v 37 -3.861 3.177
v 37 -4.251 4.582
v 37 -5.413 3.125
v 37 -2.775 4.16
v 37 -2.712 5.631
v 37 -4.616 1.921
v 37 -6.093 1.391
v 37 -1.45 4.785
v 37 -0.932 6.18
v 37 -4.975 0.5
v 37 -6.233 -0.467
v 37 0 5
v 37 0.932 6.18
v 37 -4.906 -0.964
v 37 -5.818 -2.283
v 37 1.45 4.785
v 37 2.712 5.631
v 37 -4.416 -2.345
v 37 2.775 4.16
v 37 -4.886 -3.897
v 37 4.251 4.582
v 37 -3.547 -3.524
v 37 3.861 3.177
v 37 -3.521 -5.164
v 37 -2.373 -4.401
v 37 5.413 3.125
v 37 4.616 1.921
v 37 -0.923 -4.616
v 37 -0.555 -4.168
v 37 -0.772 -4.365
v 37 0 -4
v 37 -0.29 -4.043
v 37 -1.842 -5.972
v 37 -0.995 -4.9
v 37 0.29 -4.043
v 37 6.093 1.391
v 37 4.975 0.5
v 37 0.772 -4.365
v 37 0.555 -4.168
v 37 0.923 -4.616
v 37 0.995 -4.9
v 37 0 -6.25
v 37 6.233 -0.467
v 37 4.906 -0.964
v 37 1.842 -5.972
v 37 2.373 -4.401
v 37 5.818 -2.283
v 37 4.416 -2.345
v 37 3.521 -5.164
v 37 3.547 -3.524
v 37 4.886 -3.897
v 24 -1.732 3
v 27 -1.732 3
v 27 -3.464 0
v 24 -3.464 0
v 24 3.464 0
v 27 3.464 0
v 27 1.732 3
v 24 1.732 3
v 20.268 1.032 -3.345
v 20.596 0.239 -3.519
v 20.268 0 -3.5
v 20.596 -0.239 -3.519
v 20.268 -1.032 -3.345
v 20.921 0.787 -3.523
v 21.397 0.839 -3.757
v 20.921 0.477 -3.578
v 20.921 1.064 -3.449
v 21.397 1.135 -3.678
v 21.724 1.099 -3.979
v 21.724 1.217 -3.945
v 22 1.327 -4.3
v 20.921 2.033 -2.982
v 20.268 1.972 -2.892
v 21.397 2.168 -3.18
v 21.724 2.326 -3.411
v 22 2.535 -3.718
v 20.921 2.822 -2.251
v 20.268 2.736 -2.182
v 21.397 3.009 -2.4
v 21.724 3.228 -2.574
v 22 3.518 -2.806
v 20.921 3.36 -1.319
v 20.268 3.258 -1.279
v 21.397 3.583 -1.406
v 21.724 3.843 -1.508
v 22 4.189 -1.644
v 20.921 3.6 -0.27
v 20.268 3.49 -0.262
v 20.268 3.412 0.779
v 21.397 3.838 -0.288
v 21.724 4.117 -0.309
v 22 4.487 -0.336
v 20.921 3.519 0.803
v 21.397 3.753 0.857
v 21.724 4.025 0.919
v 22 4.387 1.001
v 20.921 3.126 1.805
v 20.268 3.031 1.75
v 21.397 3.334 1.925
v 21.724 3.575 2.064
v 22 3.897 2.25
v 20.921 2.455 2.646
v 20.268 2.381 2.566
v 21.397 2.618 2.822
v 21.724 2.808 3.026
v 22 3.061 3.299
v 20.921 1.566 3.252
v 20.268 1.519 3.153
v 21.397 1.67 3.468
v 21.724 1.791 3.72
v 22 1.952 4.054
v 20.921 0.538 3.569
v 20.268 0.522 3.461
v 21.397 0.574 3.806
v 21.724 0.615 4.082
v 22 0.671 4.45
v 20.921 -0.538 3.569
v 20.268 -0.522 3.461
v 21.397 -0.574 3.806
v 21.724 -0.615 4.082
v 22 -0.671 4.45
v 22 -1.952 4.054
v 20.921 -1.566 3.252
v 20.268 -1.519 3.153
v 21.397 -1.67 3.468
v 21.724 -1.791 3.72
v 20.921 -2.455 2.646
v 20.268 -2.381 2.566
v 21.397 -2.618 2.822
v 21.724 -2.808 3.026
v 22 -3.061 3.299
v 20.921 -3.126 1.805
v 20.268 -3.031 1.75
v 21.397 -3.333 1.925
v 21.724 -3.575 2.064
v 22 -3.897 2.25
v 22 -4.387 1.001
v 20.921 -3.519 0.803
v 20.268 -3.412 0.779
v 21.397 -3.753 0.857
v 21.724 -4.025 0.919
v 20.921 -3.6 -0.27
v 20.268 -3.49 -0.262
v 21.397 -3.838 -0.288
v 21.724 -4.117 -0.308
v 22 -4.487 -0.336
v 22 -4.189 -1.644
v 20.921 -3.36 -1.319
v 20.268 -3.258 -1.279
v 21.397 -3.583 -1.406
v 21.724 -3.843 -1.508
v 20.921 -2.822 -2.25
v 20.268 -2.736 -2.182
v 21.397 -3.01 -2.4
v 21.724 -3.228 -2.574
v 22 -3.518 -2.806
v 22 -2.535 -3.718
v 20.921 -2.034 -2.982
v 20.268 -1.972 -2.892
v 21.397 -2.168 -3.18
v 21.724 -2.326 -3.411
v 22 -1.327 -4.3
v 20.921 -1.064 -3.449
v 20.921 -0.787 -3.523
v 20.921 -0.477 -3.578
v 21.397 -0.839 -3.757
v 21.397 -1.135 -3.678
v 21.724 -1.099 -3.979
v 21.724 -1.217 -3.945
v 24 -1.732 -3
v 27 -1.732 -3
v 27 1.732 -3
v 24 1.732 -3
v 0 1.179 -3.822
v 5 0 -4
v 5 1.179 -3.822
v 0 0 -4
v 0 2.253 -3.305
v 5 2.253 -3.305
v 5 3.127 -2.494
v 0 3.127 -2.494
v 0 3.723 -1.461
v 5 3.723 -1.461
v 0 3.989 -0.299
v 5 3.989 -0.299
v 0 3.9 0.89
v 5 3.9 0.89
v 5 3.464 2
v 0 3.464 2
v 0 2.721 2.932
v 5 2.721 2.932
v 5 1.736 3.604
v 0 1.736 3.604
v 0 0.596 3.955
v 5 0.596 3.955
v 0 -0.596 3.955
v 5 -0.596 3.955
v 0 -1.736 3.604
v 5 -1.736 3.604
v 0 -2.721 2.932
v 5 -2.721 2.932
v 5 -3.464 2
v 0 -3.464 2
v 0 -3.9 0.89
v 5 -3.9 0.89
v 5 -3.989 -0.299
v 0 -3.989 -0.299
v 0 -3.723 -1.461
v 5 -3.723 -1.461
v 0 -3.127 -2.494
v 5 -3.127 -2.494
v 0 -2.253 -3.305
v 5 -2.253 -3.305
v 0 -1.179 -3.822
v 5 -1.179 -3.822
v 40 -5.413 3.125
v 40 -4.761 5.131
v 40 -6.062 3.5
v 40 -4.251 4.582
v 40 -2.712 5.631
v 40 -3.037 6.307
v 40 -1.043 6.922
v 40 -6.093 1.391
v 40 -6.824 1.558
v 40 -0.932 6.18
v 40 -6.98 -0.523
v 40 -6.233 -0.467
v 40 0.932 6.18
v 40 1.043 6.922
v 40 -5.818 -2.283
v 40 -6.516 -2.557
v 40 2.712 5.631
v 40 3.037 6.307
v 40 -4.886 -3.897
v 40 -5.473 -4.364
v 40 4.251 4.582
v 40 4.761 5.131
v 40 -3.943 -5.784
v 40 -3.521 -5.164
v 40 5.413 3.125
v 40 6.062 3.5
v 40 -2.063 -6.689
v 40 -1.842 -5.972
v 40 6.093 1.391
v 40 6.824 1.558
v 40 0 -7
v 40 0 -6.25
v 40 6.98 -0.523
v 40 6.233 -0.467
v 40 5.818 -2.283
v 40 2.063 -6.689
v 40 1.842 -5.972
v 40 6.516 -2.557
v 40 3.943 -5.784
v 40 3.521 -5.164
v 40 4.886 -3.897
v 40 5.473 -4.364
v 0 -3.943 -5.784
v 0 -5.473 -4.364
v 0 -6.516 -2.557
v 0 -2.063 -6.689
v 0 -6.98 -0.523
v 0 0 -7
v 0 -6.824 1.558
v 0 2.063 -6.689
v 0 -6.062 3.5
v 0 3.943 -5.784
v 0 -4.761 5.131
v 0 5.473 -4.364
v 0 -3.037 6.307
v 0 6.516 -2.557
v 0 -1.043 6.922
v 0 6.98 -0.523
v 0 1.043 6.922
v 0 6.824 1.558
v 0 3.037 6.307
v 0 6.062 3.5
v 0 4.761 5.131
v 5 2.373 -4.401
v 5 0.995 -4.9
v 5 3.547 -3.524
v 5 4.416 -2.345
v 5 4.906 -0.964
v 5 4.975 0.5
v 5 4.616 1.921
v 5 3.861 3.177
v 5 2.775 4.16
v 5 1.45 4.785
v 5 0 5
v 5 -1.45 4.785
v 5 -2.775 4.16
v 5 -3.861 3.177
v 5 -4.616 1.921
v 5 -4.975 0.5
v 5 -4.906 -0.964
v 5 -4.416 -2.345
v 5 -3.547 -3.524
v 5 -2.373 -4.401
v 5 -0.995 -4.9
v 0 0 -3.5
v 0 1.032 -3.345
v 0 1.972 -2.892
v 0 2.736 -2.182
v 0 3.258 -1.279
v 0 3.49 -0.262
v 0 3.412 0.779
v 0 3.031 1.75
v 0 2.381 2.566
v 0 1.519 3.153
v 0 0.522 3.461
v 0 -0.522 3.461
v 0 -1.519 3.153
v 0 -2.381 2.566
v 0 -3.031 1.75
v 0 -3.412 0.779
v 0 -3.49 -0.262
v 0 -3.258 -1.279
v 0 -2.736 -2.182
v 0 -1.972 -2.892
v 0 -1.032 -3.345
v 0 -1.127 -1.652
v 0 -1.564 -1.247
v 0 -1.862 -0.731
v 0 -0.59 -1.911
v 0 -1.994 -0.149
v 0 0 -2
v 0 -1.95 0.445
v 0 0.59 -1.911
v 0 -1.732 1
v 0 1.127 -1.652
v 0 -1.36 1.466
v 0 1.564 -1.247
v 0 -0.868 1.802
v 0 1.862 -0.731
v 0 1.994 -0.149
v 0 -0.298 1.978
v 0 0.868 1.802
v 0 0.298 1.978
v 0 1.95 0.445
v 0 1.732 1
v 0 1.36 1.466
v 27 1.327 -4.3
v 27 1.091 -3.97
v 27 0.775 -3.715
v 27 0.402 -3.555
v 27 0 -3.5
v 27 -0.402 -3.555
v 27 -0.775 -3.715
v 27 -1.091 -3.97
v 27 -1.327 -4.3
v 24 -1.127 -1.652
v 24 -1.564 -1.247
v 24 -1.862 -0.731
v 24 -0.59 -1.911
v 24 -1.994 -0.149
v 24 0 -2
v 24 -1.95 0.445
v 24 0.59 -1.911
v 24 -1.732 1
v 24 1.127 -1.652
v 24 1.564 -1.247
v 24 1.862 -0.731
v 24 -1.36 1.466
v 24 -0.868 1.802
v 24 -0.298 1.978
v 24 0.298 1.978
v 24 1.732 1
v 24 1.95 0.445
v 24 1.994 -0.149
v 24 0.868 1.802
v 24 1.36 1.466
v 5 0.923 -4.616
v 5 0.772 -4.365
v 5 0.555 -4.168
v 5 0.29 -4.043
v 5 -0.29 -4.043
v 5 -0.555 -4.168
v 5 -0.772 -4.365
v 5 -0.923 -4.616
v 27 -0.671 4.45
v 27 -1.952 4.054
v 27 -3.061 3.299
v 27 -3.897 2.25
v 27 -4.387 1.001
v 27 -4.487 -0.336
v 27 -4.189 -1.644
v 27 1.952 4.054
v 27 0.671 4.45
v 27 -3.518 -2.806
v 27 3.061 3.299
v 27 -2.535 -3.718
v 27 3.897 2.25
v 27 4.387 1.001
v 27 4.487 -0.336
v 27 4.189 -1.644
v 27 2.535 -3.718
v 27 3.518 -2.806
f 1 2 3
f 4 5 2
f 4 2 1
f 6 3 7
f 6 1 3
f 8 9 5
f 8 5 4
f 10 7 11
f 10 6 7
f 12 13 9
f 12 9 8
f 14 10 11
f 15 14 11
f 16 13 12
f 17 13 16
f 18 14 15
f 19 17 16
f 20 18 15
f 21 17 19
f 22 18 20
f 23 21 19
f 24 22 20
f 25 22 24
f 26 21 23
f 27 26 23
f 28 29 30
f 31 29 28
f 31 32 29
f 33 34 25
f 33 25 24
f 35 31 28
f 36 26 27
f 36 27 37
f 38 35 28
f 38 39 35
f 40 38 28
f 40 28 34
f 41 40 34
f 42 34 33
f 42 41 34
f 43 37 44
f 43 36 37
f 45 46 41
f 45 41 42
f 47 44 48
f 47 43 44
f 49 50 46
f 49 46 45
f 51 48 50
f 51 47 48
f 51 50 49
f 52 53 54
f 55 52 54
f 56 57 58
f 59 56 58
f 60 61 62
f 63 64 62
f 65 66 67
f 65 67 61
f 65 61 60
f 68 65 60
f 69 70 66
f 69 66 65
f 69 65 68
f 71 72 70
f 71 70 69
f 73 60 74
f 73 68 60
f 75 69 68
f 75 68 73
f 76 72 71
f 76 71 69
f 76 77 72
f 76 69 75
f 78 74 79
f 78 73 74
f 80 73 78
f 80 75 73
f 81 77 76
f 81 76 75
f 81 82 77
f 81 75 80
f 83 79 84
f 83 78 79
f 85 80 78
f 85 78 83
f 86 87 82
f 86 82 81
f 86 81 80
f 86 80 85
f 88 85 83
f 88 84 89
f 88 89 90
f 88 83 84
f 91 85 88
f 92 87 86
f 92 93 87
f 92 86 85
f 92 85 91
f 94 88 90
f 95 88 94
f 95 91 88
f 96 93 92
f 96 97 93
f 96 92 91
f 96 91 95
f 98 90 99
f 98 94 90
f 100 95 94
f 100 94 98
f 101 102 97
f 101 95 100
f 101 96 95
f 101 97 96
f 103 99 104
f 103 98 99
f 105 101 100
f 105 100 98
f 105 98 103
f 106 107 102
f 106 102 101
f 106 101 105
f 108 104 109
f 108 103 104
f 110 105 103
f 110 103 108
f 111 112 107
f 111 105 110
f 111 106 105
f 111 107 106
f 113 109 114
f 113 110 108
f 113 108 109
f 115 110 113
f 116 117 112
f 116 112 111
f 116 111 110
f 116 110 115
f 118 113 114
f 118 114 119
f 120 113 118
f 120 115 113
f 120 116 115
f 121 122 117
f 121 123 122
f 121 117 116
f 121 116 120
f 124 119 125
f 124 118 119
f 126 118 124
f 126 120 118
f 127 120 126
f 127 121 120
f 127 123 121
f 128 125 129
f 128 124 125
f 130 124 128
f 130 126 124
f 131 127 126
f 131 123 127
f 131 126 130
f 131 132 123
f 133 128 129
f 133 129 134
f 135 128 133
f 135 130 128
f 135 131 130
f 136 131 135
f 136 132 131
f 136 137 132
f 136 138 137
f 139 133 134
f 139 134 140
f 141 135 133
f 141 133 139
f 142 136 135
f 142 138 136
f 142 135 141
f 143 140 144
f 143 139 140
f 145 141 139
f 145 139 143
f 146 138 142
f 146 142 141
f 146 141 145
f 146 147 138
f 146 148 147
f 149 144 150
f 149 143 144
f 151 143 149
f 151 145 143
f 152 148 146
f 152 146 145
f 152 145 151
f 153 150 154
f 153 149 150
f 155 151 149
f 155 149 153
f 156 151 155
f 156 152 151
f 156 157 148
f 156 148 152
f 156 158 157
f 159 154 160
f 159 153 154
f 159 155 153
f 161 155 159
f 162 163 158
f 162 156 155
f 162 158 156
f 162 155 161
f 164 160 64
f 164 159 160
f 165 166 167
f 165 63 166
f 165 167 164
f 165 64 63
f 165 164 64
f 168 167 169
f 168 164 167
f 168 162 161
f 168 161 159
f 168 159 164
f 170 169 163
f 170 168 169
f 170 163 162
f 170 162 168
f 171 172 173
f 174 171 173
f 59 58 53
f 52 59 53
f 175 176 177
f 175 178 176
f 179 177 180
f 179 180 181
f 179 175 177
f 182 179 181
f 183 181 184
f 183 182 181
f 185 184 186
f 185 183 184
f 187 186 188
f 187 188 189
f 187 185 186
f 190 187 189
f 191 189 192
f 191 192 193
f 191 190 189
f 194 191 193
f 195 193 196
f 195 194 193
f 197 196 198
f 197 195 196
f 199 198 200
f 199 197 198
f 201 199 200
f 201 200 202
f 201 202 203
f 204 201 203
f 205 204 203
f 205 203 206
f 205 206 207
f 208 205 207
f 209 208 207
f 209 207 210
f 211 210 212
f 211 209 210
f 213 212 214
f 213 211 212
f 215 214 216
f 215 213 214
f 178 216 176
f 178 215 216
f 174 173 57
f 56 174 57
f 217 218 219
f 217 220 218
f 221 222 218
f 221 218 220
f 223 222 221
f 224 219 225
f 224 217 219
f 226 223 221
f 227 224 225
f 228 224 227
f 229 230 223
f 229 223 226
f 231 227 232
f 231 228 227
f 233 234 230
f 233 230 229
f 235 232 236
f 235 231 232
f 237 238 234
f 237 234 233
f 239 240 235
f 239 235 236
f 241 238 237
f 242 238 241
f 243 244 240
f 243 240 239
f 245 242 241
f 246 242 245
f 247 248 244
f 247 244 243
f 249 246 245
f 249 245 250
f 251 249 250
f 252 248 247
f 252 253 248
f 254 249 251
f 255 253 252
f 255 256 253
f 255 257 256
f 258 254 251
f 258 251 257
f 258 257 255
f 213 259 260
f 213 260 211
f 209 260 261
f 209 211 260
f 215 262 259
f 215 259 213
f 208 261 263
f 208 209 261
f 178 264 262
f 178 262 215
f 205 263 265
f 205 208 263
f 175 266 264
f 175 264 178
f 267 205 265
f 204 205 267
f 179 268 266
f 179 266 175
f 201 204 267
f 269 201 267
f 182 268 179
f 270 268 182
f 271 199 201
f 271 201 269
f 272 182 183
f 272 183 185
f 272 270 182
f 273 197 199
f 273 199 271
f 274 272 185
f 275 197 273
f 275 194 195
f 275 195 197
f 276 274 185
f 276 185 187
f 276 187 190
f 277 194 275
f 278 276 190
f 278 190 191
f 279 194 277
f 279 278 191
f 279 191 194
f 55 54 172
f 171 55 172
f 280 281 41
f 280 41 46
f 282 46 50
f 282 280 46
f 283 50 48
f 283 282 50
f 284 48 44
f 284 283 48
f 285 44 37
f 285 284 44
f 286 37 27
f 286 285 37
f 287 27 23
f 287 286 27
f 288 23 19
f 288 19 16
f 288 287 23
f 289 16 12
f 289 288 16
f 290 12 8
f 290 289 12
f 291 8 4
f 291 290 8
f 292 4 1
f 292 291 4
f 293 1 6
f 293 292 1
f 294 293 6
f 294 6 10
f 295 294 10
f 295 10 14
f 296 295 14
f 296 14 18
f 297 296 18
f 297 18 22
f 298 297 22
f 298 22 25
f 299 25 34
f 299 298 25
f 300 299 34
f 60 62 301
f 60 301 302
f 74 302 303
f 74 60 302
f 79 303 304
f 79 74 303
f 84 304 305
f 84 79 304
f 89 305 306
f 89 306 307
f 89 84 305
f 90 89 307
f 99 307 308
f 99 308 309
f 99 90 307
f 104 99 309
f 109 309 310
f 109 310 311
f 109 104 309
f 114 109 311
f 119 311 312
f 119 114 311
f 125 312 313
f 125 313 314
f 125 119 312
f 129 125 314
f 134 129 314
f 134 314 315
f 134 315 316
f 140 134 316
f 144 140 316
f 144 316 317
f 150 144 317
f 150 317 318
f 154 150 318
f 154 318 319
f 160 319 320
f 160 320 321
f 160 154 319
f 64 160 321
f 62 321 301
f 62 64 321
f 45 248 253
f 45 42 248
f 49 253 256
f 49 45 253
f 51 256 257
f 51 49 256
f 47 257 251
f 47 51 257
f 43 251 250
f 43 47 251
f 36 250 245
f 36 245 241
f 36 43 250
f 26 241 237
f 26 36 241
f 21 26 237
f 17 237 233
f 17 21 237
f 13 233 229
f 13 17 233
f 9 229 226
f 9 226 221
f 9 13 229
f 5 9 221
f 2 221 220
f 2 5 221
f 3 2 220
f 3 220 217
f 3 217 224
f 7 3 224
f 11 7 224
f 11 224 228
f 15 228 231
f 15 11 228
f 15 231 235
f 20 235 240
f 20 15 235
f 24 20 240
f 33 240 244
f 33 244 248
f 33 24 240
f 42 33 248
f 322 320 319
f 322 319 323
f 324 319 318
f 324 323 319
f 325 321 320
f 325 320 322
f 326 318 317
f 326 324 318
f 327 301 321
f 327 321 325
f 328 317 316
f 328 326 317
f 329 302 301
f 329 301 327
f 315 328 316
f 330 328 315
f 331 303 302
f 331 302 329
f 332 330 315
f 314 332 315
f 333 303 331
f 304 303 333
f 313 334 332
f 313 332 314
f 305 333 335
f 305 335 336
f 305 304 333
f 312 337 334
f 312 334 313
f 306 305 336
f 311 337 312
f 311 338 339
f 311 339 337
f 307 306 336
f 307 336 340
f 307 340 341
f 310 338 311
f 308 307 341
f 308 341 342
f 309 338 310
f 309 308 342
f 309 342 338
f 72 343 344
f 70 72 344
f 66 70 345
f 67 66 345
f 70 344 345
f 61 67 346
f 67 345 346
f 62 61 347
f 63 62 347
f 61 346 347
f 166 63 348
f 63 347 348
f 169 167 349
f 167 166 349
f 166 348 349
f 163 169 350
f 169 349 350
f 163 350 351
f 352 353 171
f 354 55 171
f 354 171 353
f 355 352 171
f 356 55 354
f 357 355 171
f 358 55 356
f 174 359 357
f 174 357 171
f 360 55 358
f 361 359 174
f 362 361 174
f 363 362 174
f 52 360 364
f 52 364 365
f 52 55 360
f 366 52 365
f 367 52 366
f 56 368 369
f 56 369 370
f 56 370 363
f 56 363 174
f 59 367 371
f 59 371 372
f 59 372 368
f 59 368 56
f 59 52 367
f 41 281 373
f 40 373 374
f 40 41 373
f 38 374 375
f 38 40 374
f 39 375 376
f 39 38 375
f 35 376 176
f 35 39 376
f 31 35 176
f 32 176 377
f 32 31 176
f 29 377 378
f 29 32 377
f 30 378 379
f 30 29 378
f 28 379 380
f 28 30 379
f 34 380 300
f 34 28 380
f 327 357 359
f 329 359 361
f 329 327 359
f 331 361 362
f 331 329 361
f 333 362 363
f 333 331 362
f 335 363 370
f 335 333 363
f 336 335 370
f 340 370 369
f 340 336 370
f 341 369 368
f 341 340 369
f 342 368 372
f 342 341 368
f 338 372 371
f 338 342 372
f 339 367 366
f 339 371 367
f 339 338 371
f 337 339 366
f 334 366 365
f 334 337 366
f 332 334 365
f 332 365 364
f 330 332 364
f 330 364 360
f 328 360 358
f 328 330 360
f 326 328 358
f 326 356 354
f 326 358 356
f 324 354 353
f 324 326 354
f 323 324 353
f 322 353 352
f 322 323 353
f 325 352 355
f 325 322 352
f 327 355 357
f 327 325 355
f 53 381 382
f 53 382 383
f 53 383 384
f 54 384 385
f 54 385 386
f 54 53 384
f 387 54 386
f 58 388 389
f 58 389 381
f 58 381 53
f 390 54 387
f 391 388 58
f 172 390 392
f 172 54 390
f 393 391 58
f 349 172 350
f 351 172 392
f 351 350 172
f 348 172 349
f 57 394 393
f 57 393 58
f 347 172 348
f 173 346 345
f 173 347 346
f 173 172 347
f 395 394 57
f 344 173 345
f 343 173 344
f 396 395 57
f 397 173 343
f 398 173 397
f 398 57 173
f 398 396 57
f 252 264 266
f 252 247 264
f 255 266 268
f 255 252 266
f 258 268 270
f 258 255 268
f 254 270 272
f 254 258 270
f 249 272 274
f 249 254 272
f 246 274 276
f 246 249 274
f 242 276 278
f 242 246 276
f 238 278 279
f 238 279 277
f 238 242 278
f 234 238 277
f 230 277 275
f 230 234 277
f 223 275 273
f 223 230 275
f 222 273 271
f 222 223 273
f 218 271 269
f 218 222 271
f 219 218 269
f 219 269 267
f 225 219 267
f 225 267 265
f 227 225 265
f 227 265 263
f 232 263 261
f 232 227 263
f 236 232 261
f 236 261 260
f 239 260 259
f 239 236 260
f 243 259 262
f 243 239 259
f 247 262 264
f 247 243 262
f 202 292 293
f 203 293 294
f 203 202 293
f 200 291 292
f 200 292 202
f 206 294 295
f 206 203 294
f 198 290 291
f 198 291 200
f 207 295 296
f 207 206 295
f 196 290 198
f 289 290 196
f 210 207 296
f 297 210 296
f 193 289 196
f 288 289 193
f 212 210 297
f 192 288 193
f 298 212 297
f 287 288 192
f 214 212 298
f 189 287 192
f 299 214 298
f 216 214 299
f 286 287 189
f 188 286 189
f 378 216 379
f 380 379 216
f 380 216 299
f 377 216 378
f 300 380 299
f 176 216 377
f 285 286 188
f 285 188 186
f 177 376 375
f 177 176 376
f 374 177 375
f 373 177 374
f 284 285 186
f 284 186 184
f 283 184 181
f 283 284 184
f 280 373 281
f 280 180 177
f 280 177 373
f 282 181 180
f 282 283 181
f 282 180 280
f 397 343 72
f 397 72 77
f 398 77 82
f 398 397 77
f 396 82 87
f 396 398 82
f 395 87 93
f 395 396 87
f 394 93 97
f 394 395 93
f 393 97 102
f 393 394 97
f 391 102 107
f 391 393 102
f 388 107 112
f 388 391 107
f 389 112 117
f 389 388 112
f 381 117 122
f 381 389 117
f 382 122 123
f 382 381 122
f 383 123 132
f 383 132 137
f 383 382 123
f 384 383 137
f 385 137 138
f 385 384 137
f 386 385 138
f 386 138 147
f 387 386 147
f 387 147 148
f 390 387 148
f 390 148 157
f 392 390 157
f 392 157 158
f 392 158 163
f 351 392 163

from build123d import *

# Parameters (mm, degrees)
F2_R     = 1
F3_DEPTH = 37
F5_R     = 1.5
F6_DEPTH = 27.001
F8_DEPTH = 3


# Not quite as in the source:
# - a fillet or chamfer that OpenCascade refuses, or shapes differently, is made with other operations: its cross-section is extruded or revolved along the edge and cut away or added


with BuildPart() as f1:
    # F0 (on Front) → F1 (revolve)
    with BuildSketch(Plane.XZ):
        Polygon((0, -7), (40, -7), (40, -6.25), (37, -6.25), (37, -5), (5, -5), (5, -4), (0, -4), align=None)
    revolve(axis=Axis((17.6803227514, 0, 0), (1, 0, 0)))

    # F2 (on face) → F3 (join, through all)
    with BuildSketch(Plane.YZ.offset(37)):
        with Locations((0, -5)):
            Circle(F2_R)
    extrude(amount=-F3_DEPTH)


with BuildPart() as f1b:
    # F0 (on Front) → F1, piece 2 (revolve)
    with BuildSketch(Plane.XZ):
        Polygon((0, -2), (0, -3.5), (22, -3.5), (22, -4.5), (27, -4.5), (27, -2), align=None)
    revolve(axis=Axis((17.6803227514, 0, 0), (1, 0, 0)))

    # F4: fillet of radius 2 on 1 edges, made by hand

    # F4_s1 → F4_t2 (revolve)
    with BuildSketch(Plane.XZ):
        with BuildLine():
            ThreePointArc((20.2679491924, -3.5), (21.2679491924, -3.7679491924), (22, -4.5))
            Line((22, -4.5), (22, -3.5))
            Line((22, -3.5), (20.2679491924, -3.5))
        make_face()
    revolve(axis=Axis((22, 0, 0), (1, 0, 0)))

    # F5 (on face) → F6 (cut, through all)
    with BuildSketch(Plane.YZ.offset(27)):
        with Locations((0, -5)):
            Circle(F5_R)
    extrude(amount=-F6_DEPTH, mode=Mode.SUBTRACT)

    # F7 (on face) → F8 (cut)
    with BuildSketch(Plane.YZ.offset(27)):
        Polygon((1.7320508076, 3), (-1.7320508076, 3), (-3.4641016151, 0), (-1.7320508076, -3), (1.7320508076, -3), (3.4641016151, 0), align=None)
    extrude(amount=-F8_DEPTH, mode=Mode.SUBTRACT)


solid = Compound([f1.part, f1b.part])
